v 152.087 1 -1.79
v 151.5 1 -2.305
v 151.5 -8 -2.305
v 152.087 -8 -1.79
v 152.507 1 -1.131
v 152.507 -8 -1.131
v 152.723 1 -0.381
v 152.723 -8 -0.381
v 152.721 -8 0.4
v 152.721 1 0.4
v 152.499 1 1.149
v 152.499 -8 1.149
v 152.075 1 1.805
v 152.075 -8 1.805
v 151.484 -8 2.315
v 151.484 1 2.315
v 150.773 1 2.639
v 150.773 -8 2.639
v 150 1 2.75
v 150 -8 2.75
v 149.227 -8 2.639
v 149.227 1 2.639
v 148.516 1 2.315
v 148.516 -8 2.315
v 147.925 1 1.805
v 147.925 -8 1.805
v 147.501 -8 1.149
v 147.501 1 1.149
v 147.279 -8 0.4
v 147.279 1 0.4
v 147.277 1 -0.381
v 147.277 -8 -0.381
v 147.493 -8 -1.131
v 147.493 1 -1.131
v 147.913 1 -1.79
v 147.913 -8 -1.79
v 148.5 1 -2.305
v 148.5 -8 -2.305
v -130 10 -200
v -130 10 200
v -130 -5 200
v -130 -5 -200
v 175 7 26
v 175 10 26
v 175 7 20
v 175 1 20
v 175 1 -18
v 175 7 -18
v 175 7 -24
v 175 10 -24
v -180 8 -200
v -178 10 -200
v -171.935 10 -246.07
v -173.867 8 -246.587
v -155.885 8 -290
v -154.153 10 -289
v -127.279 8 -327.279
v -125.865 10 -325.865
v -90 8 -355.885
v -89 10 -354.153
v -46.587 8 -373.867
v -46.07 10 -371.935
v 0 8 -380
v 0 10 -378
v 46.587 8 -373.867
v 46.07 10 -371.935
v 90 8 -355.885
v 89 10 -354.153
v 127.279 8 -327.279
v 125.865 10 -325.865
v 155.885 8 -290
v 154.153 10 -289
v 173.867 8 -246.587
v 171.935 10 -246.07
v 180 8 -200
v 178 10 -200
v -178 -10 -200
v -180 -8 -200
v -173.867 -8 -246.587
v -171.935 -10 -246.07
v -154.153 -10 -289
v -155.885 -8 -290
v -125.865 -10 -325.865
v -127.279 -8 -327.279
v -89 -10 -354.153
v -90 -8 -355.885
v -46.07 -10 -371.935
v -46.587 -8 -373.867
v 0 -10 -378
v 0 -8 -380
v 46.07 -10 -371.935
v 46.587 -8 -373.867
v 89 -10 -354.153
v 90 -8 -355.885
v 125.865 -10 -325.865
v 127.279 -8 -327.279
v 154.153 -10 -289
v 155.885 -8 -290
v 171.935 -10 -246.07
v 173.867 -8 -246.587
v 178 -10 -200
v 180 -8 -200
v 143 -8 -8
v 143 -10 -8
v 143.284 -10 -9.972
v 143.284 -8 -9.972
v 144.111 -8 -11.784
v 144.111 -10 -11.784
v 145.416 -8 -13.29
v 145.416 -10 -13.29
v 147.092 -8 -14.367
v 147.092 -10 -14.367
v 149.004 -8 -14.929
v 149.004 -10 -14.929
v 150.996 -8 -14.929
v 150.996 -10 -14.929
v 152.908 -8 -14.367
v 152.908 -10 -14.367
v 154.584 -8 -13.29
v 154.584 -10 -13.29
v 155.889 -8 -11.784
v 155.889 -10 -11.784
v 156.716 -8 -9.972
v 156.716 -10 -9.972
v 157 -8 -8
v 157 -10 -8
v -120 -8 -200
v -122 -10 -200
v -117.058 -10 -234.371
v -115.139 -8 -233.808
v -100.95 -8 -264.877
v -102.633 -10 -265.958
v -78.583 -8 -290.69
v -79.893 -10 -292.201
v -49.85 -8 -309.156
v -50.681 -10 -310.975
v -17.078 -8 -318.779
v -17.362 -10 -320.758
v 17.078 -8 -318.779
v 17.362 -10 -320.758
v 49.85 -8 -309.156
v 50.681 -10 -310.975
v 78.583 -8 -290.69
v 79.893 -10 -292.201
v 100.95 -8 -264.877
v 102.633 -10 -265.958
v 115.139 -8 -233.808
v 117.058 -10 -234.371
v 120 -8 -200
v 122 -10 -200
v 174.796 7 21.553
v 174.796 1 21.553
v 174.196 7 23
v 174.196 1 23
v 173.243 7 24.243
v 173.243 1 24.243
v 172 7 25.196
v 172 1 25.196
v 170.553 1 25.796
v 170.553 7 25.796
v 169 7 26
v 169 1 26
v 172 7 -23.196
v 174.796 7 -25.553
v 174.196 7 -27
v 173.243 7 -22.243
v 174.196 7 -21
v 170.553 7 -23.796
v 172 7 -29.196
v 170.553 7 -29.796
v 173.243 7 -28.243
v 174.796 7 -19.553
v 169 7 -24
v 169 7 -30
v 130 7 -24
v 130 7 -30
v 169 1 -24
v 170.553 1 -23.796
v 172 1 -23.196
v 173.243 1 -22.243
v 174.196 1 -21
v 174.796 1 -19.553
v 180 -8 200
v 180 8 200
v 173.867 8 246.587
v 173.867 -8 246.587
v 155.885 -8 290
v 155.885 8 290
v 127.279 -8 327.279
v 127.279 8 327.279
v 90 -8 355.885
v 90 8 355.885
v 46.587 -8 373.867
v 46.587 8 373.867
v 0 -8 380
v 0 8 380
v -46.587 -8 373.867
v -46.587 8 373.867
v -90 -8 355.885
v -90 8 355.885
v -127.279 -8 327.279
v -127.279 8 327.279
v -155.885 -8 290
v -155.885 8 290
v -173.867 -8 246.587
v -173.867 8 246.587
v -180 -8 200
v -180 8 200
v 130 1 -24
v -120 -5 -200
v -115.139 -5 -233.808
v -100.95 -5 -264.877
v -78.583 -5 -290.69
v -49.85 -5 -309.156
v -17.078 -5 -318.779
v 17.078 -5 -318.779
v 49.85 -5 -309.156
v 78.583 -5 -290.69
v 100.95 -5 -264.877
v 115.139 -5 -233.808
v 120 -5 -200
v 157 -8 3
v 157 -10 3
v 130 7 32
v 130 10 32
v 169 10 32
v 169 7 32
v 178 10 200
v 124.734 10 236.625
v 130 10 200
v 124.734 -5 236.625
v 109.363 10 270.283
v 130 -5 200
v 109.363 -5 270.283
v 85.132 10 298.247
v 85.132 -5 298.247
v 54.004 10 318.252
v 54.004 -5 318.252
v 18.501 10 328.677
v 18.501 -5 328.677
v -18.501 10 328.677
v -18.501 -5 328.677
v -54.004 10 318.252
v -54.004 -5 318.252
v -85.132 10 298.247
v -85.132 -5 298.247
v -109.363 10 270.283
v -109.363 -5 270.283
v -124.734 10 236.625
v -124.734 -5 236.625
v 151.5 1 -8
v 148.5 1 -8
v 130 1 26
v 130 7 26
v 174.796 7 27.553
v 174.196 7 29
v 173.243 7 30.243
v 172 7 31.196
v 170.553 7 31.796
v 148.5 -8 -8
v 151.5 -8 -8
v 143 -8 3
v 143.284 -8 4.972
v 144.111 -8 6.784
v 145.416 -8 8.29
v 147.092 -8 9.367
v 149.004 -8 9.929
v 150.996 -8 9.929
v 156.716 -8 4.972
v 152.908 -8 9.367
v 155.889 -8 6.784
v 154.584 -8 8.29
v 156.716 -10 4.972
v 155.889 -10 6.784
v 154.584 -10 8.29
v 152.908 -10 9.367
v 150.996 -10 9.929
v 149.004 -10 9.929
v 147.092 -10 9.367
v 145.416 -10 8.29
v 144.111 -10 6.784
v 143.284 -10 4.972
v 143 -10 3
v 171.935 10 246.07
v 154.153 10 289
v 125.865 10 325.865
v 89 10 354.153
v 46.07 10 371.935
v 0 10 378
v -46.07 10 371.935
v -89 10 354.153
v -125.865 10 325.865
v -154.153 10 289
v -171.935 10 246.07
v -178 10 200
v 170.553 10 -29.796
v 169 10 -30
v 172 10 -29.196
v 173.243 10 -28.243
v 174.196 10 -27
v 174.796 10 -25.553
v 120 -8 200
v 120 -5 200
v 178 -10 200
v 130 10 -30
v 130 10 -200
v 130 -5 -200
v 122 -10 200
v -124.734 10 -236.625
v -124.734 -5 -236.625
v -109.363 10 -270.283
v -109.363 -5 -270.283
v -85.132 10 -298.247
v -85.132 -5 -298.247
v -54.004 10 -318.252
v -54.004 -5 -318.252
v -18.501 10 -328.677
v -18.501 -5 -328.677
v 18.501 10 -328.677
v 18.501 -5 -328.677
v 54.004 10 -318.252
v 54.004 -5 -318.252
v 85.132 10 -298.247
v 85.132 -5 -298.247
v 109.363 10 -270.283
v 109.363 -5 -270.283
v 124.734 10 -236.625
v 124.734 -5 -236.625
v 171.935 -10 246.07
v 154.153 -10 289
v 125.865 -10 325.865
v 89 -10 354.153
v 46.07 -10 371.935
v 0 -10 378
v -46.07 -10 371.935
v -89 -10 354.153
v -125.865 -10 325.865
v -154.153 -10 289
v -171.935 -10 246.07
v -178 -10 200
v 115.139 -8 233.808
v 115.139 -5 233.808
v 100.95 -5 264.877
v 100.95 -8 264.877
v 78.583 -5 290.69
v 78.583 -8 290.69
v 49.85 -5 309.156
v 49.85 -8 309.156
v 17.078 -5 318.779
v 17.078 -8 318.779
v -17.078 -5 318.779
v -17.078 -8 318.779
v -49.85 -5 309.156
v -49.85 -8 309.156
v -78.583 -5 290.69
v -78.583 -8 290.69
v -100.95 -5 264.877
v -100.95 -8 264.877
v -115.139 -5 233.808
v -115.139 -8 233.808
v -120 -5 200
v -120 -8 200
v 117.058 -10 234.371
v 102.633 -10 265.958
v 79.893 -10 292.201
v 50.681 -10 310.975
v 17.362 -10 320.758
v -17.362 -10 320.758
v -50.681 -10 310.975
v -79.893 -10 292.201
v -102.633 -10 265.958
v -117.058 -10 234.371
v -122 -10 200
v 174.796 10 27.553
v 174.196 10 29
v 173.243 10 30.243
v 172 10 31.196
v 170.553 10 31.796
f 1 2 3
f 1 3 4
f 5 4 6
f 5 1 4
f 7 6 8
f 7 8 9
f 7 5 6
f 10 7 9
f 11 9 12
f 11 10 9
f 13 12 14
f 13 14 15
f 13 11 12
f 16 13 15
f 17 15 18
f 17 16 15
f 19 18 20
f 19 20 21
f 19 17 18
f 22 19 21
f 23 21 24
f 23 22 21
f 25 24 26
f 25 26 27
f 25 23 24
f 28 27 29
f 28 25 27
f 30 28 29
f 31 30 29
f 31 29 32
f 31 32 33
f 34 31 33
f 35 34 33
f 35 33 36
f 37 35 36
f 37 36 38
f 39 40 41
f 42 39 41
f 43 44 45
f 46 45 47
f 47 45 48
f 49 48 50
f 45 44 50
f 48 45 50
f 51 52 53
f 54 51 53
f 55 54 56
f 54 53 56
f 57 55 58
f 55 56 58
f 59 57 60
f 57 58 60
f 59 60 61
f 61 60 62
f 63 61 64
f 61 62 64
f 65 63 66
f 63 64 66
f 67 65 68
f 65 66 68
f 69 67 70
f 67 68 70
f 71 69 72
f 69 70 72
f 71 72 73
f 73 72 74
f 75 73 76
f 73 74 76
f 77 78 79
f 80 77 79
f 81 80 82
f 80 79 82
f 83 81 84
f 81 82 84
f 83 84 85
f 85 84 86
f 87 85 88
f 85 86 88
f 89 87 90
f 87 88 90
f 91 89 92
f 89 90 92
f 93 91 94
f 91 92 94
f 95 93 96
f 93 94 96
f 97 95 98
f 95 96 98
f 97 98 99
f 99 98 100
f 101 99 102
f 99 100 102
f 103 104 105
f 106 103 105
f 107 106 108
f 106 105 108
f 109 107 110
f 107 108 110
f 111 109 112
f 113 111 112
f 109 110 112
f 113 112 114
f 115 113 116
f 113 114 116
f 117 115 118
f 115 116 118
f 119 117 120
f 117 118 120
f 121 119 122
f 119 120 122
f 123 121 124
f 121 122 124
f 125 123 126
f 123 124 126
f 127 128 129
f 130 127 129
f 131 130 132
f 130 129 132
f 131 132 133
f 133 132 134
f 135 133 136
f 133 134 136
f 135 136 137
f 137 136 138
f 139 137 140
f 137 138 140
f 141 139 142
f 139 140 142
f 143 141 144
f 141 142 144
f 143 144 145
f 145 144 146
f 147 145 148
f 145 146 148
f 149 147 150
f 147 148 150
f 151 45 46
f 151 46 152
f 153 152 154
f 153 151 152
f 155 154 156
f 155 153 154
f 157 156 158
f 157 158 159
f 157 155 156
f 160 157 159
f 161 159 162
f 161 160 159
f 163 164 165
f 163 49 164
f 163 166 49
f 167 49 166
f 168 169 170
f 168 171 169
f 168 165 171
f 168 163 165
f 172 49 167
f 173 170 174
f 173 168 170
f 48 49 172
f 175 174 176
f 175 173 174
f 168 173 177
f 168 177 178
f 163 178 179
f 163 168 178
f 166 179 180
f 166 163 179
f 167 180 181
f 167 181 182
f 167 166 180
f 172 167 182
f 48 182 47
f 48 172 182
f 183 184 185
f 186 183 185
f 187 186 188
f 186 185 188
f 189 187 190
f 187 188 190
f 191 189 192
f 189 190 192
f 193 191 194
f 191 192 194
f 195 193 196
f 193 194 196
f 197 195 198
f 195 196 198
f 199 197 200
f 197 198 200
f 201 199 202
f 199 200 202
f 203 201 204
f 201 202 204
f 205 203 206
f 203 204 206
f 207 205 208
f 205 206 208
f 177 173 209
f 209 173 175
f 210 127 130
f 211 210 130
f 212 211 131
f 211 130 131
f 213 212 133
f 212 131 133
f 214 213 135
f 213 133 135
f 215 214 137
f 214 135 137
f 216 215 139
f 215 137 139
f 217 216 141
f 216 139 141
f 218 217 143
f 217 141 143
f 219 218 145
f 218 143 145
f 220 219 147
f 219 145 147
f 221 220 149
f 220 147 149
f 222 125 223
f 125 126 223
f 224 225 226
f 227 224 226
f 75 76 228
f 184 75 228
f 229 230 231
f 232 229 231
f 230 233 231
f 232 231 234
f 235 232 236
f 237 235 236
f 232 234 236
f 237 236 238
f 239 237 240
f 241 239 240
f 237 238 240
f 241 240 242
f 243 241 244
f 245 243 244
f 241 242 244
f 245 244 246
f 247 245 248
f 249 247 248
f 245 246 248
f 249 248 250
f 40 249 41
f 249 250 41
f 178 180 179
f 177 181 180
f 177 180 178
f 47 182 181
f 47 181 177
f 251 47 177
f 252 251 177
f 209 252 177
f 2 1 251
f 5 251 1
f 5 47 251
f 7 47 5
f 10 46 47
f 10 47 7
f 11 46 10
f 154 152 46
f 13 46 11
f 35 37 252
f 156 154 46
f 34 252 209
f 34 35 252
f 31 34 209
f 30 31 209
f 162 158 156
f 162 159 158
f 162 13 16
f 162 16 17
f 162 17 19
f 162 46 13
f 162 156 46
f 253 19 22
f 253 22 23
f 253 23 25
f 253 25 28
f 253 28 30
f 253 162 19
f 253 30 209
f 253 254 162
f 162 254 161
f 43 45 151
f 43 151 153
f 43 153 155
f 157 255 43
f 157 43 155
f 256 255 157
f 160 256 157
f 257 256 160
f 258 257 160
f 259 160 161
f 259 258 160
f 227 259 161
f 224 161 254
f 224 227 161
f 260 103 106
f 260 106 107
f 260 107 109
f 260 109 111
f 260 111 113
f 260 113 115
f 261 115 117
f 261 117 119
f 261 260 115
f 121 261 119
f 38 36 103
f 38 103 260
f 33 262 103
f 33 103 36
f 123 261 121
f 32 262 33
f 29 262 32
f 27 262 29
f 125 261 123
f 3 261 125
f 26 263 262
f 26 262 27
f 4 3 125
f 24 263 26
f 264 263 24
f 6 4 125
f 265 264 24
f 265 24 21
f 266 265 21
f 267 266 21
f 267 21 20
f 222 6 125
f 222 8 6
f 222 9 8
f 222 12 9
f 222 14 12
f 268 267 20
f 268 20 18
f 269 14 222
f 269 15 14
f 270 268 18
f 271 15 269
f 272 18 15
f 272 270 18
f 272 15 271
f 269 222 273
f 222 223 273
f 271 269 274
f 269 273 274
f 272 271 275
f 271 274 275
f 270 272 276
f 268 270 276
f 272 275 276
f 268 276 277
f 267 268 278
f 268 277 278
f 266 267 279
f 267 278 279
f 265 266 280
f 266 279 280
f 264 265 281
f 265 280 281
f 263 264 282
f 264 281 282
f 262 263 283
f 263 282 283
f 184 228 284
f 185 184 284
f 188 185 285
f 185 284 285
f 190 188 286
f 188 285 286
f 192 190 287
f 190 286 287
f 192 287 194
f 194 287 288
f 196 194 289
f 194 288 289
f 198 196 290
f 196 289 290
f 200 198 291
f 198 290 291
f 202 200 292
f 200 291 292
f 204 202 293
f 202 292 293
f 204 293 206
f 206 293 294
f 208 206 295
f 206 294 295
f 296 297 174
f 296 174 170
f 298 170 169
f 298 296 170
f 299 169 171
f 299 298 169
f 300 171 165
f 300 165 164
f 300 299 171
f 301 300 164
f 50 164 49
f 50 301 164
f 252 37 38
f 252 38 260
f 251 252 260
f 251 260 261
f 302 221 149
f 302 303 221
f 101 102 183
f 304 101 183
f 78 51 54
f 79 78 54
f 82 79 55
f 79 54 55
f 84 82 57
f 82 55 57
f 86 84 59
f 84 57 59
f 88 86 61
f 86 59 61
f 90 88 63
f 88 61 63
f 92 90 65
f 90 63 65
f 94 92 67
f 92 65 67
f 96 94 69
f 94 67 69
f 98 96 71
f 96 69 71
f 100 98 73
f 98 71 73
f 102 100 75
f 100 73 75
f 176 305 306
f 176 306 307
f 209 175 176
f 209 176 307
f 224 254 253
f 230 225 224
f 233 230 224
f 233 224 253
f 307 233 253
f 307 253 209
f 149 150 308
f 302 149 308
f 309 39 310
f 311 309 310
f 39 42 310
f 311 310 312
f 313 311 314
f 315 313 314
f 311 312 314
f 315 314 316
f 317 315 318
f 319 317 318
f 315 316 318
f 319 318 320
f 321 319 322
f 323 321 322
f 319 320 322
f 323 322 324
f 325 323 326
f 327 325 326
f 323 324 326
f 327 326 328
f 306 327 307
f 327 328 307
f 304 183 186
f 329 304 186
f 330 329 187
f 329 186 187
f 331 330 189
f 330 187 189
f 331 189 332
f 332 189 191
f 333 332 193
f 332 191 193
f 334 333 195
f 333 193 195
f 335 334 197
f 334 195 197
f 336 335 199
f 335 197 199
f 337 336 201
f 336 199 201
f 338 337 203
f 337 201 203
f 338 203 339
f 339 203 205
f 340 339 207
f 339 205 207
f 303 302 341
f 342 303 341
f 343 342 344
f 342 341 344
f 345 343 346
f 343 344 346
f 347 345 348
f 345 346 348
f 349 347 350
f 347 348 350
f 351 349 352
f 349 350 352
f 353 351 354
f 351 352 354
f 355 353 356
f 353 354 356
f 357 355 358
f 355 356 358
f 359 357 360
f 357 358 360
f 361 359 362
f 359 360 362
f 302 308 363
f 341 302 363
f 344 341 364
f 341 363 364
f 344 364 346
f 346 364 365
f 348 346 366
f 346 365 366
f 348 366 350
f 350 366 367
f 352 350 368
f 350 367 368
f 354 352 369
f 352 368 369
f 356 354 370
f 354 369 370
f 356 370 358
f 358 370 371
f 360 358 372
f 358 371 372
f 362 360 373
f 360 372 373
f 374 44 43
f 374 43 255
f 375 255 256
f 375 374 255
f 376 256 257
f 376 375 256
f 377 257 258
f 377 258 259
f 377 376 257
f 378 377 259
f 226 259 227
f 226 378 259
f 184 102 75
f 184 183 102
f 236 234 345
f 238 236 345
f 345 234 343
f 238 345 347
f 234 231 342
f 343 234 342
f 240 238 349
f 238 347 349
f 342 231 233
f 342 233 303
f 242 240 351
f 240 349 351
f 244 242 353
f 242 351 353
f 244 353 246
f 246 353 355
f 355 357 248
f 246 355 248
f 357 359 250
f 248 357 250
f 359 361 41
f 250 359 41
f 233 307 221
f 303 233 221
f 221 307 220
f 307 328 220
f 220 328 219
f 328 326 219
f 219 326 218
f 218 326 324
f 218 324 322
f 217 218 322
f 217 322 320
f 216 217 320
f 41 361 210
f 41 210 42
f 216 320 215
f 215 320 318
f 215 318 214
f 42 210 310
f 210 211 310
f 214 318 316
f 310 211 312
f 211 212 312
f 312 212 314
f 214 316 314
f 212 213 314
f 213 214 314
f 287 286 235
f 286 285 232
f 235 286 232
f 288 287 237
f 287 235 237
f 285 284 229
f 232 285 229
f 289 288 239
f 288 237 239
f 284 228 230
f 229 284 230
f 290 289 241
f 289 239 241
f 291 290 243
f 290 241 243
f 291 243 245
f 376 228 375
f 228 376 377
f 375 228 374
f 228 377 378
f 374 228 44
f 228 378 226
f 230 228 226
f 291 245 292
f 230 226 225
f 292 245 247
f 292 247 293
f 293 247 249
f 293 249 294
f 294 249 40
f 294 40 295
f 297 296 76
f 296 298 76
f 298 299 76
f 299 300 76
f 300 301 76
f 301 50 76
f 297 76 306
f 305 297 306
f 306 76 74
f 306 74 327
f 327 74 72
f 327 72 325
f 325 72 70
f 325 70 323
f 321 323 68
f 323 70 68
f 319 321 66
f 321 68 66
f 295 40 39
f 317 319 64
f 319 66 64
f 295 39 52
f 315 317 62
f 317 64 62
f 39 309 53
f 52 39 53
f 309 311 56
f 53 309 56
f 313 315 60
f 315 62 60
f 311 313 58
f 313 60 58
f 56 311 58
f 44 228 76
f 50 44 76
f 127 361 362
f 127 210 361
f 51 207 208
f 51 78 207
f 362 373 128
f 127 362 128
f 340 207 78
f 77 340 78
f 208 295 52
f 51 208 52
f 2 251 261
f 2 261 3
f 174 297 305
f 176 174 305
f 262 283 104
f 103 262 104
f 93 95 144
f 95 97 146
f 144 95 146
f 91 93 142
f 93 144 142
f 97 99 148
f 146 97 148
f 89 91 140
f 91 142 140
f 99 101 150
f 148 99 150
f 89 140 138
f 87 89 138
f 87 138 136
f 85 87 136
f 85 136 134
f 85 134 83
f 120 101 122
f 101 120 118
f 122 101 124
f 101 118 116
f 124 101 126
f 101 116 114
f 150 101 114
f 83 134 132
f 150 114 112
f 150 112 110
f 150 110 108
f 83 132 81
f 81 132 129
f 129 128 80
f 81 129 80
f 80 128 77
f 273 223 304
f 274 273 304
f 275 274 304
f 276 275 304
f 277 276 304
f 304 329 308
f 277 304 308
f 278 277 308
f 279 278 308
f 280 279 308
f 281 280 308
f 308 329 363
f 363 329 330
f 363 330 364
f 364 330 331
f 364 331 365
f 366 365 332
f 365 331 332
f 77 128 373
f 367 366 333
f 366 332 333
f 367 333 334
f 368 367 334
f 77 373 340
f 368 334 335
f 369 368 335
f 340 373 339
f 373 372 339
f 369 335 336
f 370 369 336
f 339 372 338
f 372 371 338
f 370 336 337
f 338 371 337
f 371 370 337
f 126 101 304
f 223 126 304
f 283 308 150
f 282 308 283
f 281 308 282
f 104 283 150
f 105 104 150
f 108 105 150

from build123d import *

# Parameters (mm, degrees)
EXTRUDE016_DEPTH = 6
EXTRUDE017_DEPTH = 3
EXTRUDE026_DEPTH = 9
EXTRUDE015_DEPTH = 1
CHAMFER_SIZE     = 2


with BuildPart() as lockbodycutout:
    # Sketch021 → Extrude016 (new body)
    with BuildSketch(Plane.XZ):
        with BuildLine():
            Line((-20, 26), (19, 26))
            ThreePointArc((25, 20), (23.242641, 24.242641), (19, 26))
            Line((25, 20), (25, -18))
            ThreePointArc((19, -24), (23.242641, -22.242641), (25, -18))
            Line((19, -24), (-20, -24))
            Line((-20, -24), (-20, 26))
        make_face()
    extrude(amount=EXTRUDE016_DEPTH)


with BuildPart() as lockbodycutout_1:
    # Extrude016 placement: moved
    add(lockbodycutout.part.moved(Location((150, 7, 0))))


with BuildPart() as lockmountcutout:
    # Sketch024 → Extrude017 (new body)
    with BuildSketch(Plane.XZ):
        with BuildLine():
            Line((-20, 32), (19, 32))
            ThreePointArc((25, 26), (23.242641, 30.242641), (19, 32))
            Line((25, 26), (25, -24))
            ThreePointArc((19, -30), (23.242641, -28.242641), (25, -24))
            Line((19, -30), (-20, -30))
            Line((-20, -30), (-20, 32))
        make_face()
    extrude(amount=EXTRUDE017_DEPTH)


with BuildPart() as lockmountcutout_1:
    # Extrude017 placement: moved
    add(lockmountcutout.part.moved(Location((150, 10, 0))))


with BuildPart() as keyhole:
    # Sketch034 → Extrude026 (new body)
    with BuildSketch(Plane.XZ):
        with BuildLine():
            ThreePointArc((1.5, -2.304886), (0, 2.75), (-1.5, -2.304886))
            Line((-1.5, -2.304886), (-1.5, -8))
            Line((-1.5, -8), (1.5, -8))
            Line((1.5, -8), (1.5, -2.304886))
        make_face()
    extrude(amount=EXTRUDE026_DEPTH)


with BuildPart() as keyhole_1:
    # Extrude026 placement: moved
    add(keyhole.part.moved(Location((150, 1, 0))))


with BuildPart() as doorcutouts:
    # Sketch018 → Extrude015 (new body, symmetric)
    with BuildSketch(Plane.XZ):
        with BuildLine():
            ThreePointArc((157, 3), (150, 10), (143, 3))
            Line((143, 3), (143, -8))
            ThreePointArc((143, -8), (150, -15), (157, -8))
            Line((157, -8), (157, 3))
        make_face()
    extrude(amount=EXTRUDE015_DEPTH, both=True)


with BuildPart() as doorcutouts_1:
    # Extrude015 placement: moved
    add(doorcutouts.part.moved(Location((0, -9, 0))))

    # Fusion: union LockBodyCutout, LockMountCutout, Keyhole
    add(lockbodycutout_1.part)
    add(lockmountcutout_1.part)
    add(keyhole_1.part)


with BuildPart() as door:
    # Sweep001: sweep along a path in Sketch001
    with BuildLine(Plane.XZ) as sweep001_path:
        ThreePointArc((180, 200), (0, 380), (-180, 200))
        Line((-180, 200), (-180, -200))
        ThreePointArc((-180, -200), (0, -380), (180, -200))
        Line((180, -200), (180, 200))
    # Sketch006 → Sweep001 (sweep)
    with BuildSketch(Plane.XY):
        Polygon((120, -10), (120, -5), (130, -5), (130, 10), (180, 10), (180, -10), align=None)
    sweep(path=sweep001_path.line)

    # Cut: cut DoorCutouts
    add(doorcutouts_1.part, mode=Mode.SUBTRACT)

    # Chamfer
    chamfer_edges = [door.edges().sort_by_distance(p)[0] for p in [
        (0, -10, 320),
        (0, -10, 380),
        (120, -10, 0),
        (-120, -10, 0),
        (0, 10, 380),
        (180, -10, 0),
        (-180, -10, 0),
        (0, -10, -320),
        (180, 10, 0),
        (-180, 10, 0),
        (0, -10, -380),
        (0, 10, -380),
    ]]
    chamfer(chamfer_edges, length=CHAMFER_SIZE)


solid = door.part
